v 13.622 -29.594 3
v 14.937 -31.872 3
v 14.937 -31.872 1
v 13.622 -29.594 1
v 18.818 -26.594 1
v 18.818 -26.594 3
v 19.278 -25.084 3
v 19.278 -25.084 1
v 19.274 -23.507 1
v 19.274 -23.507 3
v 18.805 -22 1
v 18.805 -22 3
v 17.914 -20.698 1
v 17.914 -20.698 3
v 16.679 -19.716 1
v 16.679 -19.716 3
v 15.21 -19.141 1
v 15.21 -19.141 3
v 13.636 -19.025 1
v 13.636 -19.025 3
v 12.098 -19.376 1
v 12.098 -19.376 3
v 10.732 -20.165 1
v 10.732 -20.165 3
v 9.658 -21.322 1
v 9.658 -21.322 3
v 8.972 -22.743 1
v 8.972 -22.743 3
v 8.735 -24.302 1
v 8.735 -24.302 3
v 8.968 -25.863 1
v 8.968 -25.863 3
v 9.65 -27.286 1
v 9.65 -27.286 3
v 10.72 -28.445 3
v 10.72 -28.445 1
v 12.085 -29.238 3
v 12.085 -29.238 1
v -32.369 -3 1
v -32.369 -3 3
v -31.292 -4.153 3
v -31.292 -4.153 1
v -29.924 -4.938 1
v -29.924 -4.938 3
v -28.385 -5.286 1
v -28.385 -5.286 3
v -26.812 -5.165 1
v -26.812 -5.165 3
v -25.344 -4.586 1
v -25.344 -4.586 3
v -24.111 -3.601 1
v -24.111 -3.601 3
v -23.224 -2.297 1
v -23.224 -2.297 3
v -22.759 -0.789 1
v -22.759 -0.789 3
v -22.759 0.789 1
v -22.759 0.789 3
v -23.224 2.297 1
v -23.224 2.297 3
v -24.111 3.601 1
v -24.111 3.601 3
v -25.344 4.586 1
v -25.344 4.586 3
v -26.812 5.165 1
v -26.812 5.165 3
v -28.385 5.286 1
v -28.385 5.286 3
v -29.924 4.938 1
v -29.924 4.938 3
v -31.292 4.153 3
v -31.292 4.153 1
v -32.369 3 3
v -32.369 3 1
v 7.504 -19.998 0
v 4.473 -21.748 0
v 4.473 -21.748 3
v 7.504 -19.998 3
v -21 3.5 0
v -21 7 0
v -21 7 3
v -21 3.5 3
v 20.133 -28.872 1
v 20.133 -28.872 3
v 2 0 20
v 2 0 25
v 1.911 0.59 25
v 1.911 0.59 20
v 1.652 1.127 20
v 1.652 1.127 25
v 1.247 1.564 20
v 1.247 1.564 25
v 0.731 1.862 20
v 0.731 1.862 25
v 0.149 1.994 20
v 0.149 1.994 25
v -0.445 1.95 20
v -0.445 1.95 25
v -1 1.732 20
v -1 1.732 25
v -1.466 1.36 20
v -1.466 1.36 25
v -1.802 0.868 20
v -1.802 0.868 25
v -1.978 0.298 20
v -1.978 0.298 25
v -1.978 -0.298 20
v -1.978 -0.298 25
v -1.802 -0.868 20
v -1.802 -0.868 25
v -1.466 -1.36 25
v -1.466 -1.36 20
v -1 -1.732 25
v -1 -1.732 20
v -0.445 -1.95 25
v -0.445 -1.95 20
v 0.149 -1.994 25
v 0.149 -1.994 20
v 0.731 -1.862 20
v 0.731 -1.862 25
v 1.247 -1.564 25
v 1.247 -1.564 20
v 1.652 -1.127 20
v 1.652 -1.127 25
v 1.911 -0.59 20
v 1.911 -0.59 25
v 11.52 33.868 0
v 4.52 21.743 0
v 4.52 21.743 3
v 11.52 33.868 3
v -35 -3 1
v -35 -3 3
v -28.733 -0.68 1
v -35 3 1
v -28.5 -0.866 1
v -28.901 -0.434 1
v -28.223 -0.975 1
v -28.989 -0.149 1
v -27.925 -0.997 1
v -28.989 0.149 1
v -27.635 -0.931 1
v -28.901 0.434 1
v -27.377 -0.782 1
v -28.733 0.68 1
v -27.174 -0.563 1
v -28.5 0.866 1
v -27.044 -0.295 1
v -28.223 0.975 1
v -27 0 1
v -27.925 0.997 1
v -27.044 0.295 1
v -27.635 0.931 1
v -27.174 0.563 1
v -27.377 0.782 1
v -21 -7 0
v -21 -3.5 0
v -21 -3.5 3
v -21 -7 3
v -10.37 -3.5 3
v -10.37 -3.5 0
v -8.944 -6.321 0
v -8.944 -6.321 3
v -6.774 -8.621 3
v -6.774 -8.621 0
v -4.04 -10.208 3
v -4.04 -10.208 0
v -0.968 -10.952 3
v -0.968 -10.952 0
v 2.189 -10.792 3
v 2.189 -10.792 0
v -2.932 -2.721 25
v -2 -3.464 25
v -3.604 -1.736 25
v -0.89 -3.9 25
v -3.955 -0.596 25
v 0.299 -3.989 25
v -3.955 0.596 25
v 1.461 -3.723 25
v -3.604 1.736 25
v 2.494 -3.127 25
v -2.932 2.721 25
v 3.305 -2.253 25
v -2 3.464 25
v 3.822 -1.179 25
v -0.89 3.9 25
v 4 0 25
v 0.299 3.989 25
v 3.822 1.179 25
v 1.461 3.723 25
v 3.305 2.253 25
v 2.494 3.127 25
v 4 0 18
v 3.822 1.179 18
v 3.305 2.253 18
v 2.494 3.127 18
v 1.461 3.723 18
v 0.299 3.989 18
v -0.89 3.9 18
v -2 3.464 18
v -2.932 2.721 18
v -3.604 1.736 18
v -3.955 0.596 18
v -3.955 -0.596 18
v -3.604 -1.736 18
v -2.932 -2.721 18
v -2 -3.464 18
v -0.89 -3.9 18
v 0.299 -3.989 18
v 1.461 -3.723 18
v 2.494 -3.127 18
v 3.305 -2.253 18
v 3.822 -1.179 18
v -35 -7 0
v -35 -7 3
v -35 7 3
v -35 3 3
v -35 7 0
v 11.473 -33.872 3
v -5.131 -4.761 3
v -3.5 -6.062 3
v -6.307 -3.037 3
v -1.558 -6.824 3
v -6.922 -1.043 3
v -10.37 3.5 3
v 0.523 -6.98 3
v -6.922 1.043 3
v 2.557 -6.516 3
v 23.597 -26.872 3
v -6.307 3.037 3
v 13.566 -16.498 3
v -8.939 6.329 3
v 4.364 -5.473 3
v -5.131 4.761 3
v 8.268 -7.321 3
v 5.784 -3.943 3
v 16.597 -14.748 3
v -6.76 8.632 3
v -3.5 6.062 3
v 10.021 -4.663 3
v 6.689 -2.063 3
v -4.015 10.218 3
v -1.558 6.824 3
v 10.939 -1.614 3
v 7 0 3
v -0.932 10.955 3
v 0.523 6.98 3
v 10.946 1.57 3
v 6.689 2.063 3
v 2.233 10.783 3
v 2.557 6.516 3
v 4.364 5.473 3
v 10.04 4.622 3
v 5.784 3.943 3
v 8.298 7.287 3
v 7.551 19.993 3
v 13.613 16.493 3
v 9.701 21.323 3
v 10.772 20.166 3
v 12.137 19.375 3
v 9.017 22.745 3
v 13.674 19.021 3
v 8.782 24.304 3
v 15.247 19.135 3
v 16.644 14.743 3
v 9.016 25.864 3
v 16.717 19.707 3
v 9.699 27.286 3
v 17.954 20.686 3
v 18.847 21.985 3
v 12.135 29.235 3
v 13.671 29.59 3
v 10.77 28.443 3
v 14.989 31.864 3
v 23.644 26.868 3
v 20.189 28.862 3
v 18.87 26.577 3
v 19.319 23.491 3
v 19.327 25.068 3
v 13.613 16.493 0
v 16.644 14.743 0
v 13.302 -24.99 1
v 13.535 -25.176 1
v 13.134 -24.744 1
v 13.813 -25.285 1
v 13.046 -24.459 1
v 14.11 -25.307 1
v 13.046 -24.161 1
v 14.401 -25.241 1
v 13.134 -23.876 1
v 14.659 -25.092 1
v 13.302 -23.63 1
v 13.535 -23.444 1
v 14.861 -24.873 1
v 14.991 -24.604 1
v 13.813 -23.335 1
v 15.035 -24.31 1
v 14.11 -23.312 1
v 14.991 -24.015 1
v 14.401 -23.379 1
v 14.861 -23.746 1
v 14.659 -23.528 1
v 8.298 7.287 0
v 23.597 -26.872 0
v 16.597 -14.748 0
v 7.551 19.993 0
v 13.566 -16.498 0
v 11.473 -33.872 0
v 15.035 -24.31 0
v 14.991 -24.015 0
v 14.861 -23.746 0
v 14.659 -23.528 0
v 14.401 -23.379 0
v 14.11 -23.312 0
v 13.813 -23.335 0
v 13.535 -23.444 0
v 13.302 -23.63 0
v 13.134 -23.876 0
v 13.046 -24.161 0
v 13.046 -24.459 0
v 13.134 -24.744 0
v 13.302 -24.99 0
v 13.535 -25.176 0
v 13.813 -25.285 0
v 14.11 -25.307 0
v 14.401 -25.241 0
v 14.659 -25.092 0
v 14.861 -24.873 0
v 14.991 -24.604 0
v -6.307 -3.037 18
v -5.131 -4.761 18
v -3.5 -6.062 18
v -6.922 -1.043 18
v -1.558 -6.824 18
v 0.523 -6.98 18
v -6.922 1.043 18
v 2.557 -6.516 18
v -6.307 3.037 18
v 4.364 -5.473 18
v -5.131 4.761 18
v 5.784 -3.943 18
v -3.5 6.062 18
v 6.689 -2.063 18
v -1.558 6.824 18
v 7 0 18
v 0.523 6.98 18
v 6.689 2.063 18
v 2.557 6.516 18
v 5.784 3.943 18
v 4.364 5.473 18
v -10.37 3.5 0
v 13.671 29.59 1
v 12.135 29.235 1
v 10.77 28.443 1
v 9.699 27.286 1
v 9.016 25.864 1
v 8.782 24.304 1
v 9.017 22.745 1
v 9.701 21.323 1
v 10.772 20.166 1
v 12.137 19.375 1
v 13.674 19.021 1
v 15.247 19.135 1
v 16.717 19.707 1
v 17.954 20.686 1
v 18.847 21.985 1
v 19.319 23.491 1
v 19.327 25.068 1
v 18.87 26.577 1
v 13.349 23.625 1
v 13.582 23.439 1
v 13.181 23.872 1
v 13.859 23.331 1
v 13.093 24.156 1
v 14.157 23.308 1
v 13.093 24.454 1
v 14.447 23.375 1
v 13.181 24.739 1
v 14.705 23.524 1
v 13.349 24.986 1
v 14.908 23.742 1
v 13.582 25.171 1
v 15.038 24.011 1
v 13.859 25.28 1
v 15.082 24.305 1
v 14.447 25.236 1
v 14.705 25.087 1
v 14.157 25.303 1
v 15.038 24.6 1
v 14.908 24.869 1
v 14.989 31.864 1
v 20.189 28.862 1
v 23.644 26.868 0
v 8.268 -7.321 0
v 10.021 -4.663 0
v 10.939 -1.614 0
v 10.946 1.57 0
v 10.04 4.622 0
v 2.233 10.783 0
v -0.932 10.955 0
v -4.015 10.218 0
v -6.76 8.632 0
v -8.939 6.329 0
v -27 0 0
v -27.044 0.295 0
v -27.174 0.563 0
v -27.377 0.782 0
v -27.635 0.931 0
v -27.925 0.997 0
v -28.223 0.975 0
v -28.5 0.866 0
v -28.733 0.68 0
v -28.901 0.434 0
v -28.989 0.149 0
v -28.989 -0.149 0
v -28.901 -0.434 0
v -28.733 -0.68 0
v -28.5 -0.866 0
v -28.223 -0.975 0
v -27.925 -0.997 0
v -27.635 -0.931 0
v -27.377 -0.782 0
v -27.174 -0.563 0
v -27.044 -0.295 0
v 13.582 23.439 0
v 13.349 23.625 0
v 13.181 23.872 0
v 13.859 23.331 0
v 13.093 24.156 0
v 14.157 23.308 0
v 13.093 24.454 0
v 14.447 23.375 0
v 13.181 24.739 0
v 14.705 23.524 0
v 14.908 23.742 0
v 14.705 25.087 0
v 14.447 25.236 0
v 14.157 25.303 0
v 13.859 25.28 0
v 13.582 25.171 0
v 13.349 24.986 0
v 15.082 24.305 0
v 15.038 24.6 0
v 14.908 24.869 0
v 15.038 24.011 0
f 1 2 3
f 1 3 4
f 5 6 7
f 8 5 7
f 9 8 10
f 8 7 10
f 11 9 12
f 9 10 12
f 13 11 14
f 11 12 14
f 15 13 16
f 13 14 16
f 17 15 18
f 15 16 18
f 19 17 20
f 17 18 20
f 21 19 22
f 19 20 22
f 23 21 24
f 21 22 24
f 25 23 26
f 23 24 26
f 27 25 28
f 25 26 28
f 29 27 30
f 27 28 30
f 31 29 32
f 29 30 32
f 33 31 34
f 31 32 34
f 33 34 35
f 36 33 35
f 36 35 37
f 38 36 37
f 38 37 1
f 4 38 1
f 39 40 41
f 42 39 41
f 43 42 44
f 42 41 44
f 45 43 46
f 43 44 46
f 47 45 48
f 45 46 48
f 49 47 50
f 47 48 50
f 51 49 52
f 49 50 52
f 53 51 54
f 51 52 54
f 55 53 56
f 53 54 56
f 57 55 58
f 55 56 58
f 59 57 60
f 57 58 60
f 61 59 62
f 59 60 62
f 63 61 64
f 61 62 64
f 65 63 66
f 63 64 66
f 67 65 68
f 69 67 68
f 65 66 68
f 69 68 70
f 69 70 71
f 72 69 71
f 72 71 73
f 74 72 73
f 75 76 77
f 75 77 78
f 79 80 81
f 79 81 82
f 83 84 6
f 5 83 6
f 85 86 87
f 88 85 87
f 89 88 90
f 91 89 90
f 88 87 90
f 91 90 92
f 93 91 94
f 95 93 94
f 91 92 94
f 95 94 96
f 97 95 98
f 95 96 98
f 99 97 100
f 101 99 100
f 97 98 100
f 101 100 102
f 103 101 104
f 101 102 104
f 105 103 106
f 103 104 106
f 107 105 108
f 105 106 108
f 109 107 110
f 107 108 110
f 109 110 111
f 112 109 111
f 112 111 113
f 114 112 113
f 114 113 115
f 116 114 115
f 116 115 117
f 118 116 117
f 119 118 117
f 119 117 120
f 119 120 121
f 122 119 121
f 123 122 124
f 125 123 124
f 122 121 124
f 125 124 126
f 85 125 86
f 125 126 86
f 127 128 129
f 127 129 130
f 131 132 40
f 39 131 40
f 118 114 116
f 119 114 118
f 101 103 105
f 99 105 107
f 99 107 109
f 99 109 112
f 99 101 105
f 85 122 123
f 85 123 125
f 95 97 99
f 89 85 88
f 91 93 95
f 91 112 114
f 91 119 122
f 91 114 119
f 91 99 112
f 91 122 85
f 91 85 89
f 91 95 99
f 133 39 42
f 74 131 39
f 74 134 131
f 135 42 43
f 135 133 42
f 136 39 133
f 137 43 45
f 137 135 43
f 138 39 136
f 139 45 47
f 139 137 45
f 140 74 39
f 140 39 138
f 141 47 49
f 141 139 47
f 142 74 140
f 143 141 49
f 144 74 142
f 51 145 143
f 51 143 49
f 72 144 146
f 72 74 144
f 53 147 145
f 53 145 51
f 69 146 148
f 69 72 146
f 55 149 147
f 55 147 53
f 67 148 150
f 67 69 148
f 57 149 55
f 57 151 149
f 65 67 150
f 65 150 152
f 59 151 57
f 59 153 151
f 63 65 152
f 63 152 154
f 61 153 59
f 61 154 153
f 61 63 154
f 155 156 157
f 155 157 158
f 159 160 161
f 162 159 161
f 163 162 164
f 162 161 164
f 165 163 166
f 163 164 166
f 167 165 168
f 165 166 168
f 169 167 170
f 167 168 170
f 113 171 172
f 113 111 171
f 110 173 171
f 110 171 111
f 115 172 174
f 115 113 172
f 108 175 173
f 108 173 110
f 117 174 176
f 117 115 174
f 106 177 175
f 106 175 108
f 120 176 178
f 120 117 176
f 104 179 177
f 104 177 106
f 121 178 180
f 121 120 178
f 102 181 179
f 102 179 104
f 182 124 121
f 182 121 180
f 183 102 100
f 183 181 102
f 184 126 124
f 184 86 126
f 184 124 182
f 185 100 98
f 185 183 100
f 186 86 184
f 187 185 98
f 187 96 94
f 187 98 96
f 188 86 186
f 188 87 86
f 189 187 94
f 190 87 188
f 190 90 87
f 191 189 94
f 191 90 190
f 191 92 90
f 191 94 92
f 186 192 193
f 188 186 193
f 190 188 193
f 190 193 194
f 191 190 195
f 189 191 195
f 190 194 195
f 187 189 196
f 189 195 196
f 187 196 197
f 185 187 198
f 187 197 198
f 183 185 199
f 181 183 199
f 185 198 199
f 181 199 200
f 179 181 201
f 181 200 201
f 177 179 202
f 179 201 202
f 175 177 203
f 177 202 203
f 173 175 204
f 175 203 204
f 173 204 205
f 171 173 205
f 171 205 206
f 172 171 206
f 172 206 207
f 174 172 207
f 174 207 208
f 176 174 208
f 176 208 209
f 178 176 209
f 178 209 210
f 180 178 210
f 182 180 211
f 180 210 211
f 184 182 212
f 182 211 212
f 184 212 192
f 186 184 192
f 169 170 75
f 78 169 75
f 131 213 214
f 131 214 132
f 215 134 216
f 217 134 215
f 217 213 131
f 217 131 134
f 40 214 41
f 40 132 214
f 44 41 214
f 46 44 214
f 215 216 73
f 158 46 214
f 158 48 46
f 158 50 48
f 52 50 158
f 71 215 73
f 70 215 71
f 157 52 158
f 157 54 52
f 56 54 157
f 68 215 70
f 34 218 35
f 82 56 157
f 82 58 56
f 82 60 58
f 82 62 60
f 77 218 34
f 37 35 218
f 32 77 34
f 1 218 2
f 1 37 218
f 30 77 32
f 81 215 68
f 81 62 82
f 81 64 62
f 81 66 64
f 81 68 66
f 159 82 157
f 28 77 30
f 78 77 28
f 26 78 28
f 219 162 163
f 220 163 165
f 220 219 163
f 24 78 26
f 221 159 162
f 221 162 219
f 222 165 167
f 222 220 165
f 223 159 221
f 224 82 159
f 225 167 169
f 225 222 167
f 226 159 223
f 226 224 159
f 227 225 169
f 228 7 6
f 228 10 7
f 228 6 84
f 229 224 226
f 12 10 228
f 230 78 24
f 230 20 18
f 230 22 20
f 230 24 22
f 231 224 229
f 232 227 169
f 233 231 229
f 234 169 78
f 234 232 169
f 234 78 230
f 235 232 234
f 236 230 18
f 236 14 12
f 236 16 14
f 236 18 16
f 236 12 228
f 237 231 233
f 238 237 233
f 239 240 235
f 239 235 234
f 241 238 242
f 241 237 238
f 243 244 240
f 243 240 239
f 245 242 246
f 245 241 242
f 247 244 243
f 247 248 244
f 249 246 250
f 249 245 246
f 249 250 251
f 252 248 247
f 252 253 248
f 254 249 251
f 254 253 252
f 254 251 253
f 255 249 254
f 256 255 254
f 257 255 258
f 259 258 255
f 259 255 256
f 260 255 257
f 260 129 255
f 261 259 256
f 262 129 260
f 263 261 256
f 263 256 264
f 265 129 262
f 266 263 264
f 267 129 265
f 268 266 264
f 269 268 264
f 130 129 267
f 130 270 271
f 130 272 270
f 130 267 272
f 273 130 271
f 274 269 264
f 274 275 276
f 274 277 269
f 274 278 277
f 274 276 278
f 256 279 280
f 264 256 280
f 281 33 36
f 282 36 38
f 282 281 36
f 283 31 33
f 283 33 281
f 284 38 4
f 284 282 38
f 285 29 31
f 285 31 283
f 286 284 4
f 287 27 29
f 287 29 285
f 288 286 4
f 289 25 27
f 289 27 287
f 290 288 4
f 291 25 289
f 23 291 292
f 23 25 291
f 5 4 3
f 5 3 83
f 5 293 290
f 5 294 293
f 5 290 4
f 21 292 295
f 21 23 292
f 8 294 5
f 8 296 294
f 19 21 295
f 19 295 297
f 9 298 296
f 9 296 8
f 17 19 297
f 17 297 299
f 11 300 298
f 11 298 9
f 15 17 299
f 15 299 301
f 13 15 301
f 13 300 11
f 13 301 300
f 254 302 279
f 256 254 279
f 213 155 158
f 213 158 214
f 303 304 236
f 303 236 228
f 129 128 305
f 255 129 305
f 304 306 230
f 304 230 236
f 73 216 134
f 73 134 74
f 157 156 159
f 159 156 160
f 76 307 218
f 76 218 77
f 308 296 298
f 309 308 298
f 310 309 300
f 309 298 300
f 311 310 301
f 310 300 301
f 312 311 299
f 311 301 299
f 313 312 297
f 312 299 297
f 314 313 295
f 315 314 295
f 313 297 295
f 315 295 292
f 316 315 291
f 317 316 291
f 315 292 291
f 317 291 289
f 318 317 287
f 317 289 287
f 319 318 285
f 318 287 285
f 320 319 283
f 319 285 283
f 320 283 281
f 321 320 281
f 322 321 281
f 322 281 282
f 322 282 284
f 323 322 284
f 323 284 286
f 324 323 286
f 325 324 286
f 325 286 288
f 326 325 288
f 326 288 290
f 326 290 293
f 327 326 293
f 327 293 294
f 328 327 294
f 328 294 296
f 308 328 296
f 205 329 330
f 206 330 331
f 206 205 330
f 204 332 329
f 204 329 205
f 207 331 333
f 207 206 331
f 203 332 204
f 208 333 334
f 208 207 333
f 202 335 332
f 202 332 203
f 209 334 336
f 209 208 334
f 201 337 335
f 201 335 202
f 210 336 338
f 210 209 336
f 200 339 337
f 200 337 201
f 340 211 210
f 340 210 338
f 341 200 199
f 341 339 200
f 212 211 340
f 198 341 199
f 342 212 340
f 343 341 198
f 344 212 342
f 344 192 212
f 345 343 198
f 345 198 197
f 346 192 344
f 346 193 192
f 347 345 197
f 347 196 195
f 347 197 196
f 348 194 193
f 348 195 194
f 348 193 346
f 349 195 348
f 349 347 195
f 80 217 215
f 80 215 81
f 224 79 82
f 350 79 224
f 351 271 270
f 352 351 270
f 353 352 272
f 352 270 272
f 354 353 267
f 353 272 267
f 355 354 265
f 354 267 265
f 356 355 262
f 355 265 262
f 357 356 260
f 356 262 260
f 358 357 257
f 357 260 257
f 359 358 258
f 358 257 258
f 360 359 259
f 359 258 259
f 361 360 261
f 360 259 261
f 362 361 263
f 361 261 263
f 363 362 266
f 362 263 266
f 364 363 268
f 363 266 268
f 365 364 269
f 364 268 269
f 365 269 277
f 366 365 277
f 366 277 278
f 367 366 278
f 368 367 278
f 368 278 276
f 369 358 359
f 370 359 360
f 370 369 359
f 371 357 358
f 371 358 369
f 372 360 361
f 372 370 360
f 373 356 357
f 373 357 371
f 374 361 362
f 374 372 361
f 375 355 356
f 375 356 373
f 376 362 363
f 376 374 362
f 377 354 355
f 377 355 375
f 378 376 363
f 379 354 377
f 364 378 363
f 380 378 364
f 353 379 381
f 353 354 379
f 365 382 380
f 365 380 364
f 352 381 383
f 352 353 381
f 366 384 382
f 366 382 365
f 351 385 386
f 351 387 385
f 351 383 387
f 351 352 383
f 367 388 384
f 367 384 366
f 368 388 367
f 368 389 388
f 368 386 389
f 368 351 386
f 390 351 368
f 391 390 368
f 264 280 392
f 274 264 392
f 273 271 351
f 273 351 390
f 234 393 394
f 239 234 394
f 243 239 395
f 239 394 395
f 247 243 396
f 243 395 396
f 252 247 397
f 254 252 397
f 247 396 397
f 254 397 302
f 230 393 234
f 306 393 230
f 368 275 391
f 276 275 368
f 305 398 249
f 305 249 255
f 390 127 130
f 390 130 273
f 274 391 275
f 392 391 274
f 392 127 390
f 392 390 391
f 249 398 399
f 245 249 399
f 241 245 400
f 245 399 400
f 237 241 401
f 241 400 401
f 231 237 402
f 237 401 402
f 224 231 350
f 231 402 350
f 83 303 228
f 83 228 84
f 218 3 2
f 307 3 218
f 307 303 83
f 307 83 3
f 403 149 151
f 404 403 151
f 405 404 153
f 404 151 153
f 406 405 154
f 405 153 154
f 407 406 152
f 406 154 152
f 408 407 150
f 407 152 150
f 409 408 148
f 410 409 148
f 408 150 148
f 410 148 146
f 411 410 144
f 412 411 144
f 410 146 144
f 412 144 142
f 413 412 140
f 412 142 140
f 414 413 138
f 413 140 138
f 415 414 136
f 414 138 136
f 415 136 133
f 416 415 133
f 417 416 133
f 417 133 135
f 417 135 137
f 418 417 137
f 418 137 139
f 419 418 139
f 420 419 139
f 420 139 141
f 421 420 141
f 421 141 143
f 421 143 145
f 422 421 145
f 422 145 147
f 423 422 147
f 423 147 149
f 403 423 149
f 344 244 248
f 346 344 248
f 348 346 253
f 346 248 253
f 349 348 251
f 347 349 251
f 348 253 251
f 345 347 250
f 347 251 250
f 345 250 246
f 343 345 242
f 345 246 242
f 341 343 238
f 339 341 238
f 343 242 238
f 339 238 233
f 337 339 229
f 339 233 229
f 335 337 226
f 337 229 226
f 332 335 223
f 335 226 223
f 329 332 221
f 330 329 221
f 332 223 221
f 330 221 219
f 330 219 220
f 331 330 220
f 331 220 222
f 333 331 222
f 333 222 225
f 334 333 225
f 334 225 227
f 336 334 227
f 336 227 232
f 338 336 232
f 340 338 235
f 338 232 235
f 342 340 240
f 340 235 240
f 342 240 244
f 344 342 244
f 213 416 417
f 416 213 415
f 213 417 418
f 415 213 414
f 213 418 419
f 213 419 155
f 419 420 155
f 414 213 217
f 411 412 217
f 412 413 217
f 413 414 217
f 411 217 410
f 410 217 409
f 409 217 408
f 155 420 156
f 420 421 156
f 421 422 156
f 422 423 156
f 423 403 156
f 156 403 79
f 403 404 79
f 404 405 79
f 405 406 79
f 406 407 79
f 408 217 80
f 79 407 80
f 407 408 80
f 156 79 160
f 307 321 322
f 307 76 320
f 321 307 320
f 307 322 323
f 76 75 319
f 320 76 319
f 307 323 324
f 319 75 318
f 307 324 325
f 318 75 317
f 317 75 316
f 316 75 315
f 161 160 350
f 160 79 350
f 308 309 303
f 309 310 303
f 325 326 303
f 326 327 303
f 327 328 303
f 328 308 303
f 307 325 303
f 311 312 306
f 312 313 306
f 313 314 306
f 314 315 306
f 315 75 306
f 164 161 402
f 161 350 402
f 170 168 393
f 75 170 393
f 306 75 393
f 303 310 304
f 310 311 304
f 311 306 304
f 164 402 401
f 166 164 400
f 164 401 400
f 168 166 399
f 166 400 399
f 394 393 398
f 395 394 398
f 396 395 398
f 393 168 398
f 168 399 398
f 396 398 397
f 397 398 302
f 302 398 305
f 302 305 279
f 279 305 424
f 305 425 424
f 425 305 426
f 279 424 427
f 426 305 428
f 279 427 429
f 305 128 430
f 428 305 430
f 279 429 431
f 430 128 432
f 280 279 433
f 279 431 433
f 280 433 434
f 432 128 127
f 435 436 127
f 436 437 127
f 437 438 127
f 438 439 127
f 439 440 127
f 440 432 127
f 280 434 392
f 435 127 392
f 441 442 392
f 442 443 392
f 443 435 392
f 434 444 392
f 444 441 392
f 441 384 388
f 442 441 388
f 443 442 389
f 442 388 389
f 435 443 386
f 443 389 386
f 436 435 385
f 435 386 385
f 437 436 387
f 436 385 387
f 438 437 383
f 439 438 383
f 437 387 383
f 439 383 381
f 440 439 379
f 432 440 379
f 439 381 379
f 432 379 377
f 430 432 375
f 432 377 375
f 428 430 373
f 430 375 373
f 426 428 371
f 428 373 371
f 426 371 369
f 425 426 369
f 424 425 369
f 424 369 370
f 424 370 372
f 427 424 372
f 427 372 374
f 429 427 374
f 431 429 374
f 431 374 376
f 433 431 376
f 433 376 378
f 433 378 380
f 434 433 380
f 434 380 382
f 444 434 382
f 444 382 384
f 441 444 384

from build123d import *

# Parameters (mm, degrees)
PAD_DEPTH       = 3
POCKET_DEPTH    = 2
SKETCH002_R     = 1
POCKET001_DEPTH = 5
SKETCH003_R     = 1
POCKET002_DEPTH = 5
SKETCH004_R     = 1
POCKET003_DEPTH = 5
SKETCH005_R     = 7
PAD001_DEPTH    = 15
SKETCH006_R     = 4
PAD002_DEPTH    = 7
SKETCH007_R     = 2
POCKET004_DEPTH = 5


with BuildPart() as part:
    # Sketch001 → Pad (new body)
    with BuildSketch(Plane.XY):
        with BuildLine():
            ThreePointArc((-10.37, -3.5), (-5.464747, -9.51292), (2.189111, -10.791652))
            Line((2.189111, -10.791652), (7.504111, -19.997502))
            Line((4.473022, -21.747502), (7.504111, -19.997502))
            Line((11.473022, -33.871858), (4.473022, -21.747502))
            Line((23.597378, -26.871858), (11.473022, -33.871858))
            Line((16.597378, -14.747502), (23.597378, -26.871858))
            Line((13.566289, -16.497502), (16.597378, -14.747502))
            Line((8.268243, -7.321016), (13.566289, -16.497502))
            ThreePointArc((8.268243, -7.321016), (11.058304, -0.022464), (8.298076, 7.287423))
            Line((8.298076, 7.287423), (13.613076, 16.493273))
            Line((13.613076, 16.493273), (16.644165, 14.743273))
            Line((16.644165, 14.743273), (23.644166, 26.867628))
            Line((11.519811, 33.867628), (23.644166, 26.867628))
            Line((4.519811, 21.743272), (11.519811, 33.867628))
            Line((4.519811, 21.743272), (7.5509, 19.993272))
            Line((2.233255, 10.782842), (7.5509, 19.993272))
            ThreePointArc((2.233255, 10.782842), (-5.445271, 9.524201), (-10.37, 3.5))
            Line((-21, 3.5), (-10.37, 3.5))
            Line((-21, 7), (-21, 3.5))
            Line((-35, 7), (-21, 7))
            Line((-35, -7), (-35, 7))
            Line((-21, -7), (-35, -7))
            Line((-21, -3.5), (-21, -7))
            Line((-21, -3.5), (-10.37, -3.5))
        make_face()
    extrude(amount=PAD_DEPTH)

    # Sketch (on Face26 of Pad) → Pocket (cut)
    with BuildSketch(Plane.XY.offset(3)):
        with BuildLine():
            ThreePointArc((-32.36921, -3), (-22.7, 0), (-32.36921, 3))
            Line((-36.36921, 3), (-32.36921, 3))
            Line((-36.36921, 3), (-36.36921, -3))
            Line((-36.36921, -3), (-32.36921, -3))
        make_face()
        with BuildLine():
            ThreePointArc((18.817882, -26.593527), (11.3852, -19.719745), (13.621729, -29.593527))
            Line((16.401924, -34.408965), (13.621729, -29.593527))
            Line((16.401924, -34.408965), (21.598076, -31.408965))
            Line((21.598076, -31.408965), (18.817882, -26.593527))
        make_face()
        with BuildLine():
            ThreePointArc((13.671444, 29.589525), (11.425024, 19.719543), (18.870322, 26.577421))
            Line((21.642084, 31.378253), (18.870322, 26.577421))
            Line((16.450494, 34.386142), (21.642084, 31.378253))
            Line((13.671444, 29.589525), (16.450494, 34.386142))
        make_face()
    extrude(amount=-POCKET_DEPTH, mode=Mode.SUBTRACT)

    # Sketch002 (on Face38 of Pocket) → Pocket001 (cut)
    with BuildSketch(Plane.XY.offset(1)):
        with Locations((-28, 0)):
            Circle(SKETCH002_R)
    extrude(amount=-POCKET001_DEPTH, mode=Mode.SUBTRACT)

    # Sketch003 (on Face39 of Pocket001) → Pocket002 (cut)
    with BuildSketch(Plane.XY.offset(1)):
        with Locations((14.081988, 24.30545)):
            Circle(SKETCH003_R)
    extrude(amount=-POCKET002_DEPTH, mode=Mode.SUBTRACT)

    # Sketch004 (on Face39 of Pocket002) → Pocket003 (cut)
    with BuildSketch(Plane.XY.offset(1)):
        with Locations((14.0352, -24.30968)):
            Circle(SKETCH004_R)
    extrude(amount=-POCKET003_DEPTH, mode=Mode.SUBTRACT)

    # Sketch005 (on Face5 of Pocket003) → Pad001 (join)
    with BuildSketch(Plane.XY.offset(3)):
        Circle(SKETCH005_R)
    extrude(amount=PAD001_DEPTH)

    # Sketch006 (on Face43 of Pad001) → Pad002 (join)
    with BuildSketch(Plane.XY.offset(18)):
        Circle(SKETCH006_R)
    extrude(amount=PAD002_DEPTH)

    # Sketch007 (on Face45 of Pad002) → Pocket004 (cut)
    with BuildSketch(Plane.XY.offset(25)):
        Circle(SKETCH007_R)
    extrude(amount=-POCKET004_DEPTH, mode=Mode.SUBTRACT)


solid = part.part
